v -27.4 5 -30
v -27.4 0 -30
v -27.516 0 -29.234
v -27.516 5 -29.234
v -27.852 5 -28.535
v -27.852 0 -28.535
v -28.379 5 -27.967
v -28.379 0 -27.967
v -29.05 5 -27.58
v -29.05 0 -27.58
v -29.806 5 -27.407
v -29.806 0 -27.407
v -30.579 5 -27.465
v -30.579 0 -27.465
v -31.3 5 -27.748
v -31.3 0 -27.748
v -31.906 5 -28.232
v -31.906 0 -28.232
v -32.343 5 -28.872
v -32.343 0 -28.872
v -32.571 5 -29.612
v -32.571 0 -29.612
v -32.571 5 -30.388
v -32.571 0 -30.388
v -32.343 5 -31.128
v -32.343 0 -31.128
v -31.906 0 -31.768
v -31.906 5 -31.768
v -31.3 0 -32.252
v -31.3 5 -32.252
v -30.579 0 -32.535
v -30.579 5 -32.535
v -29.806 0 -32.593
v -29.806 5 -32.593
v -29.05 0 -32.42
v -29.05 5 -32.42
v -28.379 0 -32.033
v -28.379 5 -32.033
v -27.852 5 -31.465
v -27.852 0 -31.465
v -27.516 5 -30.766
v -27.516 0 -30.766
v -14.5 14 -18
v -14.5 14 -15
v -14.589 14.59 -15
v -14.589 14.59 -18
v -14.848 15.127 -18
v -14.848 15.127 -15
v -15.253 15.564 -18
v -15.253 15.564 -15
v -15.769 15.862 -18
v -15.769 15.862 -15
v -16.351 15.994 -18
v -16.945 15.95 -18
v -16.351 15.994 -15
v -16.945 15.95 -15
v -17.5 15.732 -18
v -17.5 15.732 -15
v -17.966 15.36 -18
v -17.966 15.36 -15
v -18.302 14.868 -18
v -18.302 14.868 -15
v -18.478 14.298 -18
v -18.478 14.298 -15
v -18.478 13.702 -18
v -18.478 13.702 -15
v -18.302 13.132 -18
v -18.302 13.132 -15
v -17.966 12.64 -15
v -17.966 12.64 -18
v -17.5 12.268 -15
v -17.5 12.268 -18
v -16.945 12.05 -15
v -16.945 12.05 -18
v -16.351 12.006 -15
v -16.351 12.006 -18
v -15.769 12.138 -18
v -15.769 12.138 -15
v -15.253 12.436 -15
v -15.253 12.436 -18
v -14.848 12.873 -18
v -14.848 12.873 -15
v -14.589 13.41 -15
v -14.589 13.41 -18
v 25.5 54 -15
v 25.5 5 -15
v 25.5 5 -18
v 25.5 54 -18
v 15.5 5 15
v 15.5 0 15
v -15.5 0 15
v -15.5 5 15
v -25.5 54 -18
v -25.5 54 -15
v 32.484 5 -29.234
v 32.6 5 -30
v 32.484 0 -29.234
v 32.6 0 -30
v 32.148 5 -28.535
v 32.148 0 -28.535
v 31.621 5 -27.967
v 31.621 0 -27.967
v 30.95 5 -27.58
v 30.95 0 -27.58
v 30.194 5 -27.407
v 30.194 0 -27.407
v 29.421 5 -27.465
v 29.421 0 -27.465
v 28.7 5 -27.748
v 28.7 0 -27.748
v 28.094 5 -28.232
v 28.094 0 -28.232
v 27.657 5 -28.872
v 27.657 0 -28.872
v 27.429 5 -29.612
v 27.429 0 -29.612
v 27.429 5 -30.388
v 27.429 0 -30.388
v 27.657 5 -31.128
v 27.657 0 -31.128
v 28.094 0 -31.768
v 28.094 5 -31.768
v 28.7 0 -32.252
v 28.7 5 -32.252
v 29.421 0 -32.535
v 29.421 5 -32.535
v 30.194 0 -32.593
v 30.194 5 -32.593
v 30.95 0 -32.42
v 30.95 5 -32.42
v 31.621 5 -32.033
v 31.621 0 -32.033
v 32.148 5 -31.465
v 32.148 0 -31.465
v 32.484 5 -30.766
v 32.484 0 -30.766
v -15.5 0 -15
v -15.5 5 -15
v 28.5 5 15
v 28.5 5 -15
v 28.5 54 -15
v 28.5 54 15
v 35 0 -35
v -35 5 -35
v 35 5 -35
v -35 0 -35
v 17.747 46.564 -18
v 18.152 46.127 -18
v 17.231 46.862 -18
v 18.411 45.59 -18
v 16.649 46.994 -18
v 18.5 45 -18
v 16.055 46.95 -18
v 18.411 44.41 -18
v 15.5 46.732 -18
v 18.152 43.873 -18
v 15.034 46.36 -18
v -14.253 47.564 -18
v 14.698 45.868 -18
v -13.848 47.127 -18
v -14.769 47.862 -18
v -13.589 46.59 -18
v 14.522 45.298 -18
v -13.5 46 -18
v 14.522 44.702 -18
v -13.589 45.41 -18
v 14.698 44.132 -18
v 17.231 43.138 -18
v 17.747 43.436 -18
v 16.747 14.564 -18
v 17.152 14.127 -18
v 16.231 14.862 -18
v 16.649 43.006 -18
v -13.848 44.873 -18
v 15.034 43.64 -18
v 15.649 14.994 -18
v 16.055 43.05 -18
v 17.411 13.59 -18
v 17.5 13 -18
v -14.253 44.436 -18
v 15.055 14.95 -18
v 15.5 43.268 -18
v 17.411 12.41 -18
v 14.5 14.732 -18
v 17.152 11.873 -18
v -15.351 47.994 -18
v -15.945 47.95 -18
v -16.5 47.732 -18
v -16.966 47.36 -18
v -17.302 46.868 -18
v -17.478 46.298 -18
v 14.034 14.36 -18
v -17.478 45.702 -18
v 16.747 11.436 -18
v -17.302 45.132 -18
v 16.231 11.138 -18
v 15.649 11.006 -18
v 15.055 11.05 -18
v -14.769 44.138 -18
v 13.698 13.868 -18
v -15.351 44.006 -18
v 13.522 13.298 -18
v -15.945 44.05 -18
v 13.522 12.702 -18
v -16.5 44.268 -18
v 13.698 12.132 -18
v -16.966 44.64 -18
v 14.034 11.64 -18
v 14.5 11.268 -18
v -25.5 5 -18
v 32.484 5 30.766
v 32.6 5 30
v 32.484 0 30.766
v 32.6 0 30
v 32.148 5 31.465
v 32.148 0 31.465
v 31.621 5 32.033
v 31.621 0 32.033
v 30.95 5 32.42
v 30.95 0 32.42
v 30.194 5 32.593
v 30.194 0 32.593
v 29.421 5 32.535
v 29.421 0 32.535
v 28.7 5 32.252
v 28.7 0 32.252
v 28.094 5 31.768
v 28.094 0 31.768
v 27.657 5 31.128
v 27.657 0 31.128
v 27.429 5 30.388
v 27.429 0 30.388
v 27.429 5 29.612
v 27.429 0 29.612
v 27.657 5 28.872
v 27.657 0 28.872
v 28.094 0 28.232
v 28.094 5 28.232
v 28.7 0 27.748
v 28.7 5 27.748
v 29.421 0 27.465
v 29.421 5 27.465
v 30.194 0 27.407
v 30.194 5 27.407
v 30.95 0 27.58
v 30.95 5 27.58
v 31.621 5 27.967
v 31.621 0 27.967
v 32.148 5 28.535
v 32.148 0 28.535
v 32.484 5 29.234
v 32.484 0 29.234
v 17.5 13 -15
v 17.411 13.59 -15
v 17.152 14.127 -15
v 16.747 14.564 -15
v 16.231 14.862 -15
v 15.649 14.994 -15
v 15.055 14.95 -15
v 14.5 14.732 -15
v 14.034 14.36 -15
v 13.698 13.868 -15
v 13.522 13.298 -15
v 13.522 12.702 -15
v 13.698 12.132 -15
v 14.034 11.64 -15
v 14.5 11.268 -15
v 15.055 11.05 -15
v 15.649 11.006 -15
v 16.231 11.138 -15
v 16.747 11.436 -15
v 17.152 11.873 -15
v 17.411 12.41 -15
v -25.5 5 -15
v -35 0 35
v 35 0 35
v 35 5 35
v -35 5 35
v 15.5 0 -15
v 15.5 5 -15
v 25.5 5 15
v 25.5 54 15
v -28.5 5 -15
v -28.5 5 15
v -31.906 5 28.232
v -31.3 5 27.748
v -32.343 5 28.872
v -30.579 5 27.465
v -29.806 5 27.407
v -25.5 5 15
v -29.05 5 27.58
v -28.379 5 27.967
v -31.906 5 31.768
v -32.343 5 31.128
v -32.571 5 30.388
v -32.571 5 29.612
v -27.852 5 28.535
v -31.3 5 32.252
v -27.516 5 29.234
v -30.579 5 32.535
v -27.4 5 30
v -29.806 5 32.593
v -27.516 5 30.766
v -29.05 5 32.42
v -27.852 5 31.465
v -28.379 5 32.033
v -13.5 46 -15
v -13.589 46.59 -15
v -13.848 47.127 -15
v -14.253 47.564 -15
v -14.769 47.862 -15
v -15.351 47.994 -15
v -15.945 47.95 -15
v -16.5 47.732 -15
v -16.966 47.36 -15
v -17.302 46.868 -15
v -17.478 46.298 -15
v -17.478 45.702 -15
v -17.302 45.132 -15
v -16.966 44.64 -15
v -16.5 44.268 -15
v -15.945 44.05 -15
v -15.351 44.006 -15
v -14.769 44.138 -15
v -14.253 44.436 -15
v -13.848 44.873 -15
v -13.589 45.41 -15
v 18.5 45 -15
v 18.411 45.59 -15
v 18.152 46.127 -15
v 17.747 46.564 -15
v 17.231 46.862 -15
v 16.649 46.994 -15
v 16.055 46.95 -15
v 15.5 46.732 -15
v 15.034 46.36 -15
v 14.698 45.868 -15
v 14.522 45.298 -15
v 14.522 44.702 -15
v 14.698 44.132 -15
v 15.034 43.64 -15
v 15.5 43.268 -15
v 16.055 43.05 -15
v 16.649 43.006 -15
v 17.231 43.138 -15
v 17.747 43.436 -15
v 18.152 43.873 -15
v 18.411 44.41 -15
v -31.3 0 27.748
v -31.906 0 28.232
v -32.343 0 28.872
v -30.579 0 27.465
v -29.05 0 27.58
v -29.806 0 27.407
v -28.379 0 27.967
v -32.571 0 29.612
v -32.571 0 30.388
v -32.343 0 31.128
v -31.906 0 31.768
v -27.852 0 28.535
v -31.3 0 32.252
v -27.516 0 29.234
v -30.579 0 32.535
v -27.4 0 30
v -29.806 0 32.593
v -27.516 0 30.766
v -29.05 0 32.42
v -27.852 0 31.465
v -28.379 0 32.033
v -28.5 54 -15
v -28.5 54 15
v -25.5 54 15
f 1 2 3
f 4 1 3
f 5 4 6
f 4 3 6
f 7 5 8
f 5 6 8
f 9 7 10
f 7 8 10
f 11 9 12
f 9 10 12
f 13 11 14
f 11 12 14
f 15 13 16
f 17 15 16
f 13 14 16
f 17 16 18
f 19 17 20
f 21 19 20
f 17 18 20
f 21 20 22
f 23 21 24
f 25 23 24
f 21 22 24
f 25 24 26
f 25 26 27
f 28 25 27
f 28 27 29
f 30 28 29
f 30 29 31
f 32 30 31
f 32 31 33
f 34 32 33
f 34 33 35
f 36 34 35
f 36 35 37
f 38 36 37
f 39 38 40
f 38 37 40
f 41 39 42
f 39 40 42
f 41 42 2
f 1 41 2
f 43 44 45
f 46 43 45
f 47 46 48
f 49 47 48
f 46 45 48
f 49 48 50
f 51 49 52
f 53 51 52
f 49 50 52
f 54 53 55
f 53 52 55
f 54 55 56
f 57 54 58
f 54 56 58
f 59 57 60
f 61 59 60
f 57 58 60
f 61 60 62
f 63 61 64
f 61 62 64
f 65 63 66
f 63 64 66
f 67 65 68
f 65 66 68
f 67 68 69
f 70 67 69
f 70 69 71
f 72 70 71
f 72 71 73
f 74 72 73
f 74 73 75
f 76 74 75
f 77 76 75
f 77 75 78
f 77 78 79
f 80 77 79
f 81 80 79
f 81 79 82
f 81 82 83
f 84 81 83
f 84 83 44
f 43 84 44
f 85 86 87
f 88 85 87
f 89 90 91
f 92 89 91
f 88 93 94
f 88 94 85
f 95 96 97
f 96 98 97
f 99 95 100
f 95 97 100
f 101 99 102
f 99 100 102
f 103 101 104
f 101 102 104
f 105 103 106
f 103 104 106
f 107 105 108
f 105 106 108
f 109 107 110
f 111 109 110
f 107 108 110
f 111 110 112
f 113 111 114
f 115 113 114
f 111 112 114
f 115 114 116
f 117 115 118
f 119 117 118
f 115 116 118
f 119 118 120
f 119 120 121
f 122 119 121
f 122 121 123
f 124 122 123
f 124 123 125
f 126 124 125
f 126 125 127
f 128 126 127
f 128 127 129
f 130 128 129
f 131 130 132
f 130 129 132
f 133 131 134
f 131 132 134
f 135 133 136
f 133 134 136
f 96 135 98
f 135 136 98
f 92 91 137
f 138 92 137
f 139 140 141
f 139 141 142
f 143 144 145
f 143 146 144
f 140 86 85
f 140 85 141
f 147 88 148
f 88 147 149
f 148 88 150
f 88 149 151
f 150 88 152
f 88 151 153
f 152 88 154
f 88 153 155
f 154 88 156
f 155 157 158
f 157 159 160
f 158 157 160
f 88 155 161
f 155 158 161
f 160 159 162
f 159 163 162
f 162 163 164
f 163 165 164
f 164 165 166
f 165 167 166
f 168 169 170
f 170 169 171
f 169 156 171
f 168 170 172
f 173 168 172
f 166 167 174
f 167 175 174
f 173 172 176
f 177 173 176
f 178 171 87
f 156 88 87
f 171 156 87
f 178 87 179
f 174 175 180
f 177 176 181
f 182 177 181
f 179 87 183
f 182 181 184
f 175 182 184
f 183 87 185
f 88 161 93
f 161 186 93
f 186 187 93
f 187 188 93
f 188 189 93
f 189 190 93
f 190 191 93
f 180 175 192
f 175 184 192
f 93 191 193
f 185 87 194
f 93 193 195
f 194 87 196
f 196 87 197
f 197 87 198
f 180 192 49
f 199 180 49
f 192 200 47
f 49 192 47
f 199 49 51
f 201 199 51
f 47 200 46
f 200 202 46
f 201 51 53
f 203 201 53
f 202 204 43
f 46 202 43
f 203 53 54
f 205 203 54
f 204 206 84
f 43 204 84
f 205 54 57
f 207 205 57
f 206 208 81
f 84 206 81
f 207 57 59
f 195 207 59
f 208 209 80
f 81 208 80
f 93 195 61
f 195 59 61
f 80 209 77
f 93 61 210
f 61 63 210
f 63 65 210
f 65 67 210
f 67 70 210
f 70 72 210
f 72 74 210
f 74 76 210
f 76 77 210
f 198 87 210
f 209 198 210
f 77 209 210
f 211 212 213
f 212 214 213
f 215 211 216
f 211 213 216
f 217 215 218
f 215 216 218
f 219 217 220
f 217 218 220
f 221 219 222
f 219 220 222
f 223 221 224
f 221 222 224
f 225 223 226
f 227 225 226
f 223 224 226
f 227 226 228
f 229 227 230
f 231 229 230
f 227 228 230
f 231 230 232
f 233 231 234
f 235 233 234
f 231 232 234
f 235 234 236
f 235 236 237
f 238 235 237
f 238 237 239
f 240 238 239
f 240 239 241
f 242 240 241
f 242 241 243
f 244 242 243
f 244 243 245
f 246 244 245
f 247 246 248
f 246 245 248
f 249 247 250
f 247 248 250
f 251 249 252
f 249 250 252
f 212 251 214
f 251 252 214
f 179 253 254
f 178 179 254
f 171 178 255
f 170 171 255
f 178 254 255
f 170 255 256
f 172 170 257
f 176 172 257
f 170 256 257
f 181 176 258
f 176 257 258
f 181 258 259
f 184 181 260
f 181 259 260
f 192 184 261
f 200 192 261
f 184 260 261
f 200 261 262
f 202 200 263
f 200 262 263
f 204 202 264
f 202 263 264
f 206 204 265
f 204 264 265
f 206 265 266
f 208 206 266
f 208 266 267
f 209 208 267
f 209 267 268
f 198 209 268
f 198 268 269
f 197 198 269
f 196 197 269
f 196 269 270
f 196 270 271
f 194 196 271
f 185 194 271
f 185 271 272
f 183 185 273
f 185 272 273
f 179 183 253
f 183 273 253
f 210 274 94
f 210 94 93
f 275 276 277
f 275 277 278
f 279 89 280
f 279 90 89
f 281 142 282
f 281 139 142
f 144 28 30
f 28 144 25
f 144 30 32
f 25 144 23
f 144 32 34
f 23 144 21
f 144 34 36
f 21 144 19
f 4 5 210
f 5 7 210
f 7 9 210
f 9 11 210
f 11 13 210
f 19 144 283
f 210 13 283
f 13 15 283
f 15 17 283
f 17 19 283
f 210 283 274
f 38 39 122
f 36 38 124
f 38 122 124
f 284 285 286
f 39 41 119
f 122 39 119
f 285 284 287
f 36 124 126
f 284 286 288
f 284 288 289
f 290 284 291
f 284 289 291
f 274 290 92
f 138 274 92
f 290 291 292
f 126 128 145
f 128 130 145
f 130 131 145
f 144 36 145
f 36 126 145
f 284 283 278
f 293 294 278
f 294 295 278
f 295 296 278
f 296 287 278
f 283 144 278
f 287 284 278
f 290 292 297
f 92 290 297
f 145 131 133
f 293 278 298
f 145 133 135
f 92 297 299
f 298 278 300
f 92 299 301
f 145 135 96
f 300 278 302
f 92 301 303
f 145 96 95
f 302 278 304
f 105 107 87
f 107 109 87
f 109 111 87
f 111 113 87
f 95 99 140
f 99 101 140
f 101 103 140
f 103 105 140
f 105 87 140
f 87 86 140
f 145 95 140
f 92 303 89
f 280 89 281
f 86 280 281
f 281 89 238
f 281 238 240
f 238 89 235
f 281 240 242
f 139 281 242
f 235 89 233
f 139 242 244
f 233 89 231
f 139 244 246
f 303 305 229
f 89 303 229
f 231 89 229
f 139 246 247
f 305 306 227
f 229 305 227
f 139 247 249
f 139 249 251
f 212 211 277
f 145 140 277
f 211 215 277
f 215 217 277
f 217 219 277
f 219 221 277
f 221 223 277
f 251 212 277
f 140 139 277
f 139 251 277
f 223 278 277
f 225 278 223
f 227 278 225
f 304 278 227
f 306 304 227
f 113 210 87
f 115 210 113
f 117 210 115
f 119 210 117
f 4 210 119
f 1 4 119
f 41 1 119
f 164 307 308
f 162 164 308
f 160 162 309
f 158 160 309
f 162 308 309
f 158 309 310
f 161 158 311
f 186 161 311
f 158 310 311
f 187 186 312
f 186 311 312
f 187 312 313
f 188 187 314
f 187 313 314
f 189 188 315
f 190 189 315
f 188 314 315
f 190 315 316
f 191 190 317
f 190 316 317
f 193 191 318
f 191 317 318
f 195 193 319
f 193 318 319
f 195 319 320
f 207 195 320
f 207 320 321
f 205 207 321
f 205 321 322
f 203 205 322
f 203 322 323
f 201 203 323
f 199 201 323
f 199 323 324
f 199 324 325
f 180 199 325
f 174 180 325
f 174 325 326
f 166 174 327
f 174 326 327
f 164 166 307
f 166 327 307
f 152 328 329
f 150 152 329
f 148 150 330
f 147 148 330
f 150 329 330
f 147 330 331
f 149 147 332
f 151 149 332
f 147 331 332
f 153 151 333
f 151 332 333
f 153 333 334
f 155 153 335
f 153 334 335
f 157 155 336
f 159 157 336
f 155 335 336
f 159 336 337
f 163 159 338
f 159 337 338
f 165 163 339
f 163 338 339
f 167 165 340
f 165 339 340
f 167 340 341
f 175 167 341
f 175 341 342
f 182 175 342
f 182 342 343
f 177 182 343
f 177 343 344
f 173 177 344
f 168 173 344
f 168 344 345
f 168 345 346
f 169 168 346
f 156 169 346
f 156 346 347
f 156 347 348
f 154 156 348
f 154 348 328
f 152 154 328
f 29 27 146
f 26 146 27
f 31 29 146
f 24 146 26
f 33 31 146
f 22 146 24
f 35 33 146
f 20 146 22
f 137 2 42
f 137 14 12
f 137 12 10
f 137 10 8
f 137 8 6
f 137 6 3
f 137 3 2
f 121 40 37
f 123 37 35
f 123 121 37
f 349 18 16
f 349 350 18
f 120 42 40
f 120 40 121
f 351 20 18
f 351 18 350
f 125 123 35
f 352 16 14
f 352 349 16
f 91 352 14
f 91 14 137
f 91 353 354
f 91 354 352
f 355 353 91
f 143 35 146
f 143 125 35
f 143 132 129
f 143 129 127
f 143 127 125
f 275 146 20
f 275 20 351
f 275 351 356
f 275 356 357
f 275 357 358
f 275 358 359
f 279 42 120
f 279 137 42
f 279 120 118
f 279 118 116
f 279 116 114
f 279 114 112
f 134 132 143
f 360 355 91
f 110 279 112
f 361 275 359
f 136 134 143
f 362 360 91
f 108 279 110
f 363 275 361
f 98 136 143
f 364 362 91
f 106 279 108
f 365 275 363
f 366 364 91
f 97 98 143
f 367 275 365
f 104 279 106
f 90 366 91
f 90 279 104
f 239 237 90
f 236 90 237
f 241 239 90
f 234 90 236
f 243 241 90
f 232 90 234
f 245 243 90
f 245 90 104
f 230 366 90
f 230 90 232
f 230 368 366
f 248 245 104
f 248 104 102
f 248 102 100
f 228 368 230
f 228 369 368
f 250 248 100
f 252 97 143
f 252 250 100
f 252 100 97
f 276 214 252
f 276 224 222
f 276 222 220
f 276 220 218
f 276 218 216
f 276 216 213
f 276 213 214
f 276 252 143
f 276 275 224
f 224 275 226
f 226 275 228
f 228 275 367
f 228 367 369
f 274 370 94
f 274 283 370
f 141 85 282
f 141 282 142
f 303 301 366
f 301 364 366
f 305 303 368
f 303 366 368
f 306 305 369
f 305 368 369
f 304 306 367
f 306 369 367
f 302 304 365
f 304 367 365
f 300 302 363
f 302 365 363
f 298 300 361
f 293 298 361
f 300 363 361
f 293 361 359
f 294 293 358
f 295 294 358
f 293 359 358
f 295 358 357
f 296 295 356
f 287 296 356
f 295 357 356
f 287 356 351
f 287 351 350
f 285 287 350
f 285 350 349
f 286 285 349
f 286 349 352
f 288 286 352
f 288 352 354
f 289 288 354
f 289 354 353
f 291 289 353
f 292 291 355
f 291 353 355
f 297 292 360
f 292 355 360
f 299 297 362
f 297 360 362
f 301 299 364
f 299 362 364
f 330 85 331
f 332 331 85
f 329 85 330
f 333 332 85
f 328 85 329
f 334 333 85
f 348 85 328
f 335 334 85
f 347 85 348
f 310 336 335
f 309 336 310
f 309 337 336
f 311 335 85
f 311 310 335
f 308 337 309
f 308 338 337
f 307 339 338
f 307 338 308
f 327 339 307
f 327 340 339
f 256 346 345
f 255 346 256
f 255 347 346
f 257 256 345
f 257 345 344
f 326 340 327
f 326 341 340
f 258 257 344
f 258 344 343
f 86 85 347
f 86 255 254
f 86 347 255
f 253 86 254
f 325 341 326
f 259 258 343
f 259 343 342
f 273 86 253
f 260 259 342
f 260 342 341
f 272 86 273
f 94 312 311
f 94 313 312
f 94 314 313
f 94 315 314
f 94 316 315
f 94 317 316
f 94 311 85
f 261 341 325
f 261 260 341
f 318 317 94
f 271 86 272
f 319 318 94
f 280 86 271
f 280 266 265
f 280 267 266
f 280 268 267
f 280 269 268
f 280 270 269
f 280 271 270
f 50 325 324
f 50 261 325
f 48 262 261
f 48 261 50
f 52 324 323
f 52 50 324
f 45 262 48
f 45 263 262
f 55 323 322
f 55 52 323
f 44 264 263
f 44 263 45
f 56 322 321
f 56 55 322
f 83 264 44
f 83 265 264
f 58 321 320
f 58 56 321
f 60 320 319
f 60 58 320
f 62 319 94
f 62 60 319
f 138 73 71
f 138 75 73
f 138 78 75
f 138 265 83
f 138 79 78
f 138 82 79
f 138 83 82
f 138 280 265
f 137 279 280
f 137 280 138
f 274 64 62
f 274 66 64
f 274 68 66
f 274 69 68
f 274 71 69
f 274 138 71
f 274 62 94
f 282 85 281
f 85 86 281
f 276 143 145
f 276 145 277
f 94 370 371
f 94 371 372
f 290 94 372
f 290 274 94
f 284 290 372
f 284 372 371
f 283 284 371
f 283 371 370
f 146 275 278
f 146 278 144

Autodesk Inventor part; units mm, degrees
ref_plane "YZ Plane" through (0, 0, 0) normal (1, 0, 0) x (0, 1, 0)
ref_plane "XZ Plane" through (0, 0, 0) normal (0, 1, 0) x (-1, 0, 0)
ref_plane "XY Plane" through (0, 0, 0) normal (0, 0, 1) x (1, 0, 0)
sketch "Boceto1" plane through (0, 0, 0) normal (0, 1, 0) x (-1, 0, 0)
  line L0 (25.5, 15) -> (-25.5, 15)
  line L1 (-25.5, 15) -> (-25.5, -15)
  line L2 (-25.5, -15) -> (25.5, -15)
  line L3 (25.5, -15) -> (25.5, 15)
  line L4 (25.5, 15) -> (-25.5, -15) construction
  line L5 (-25.5, 15) -> (25.5, -15) construction
  line L6 (-15.5, 15) -> (-15.5, -15)
  line L7 (0, 15) -> (0, 11.847)
  line L8 (-25.5, 0) -> (-22.3332, 0)
  line L9 (25.5, 15) -> (25.5, -15)
  line L10 (15.5, 15) -> (15.5, -15)
  line L11 (25.5, 0) -> (22.3332, 0)
  line L12 (-25.5, -15) -> (-25.5, 15)
  line L13 (-25.5, 0) -> (-22.3332, 0)
  line L14 (-25.5, 15) -> (-25.5, -15)
  point P0 (0, 0)
  point P1 (31.5, 22.5)
  dimension "d2" = 10
  dimension "d21" = 51
  dimension "d22" = 30
extrude "Extrusión1" add sketch "Boceto1" along normal blind 5 contours L3 L2 L10 L0 | L6 L2 L1 L0
sketch "Boceto4" plane through (0, 0, 0) normal (0, 1, 0) x (-1, 0, 0)
  line L0 (-28.5, 18) -> (28.5, 18)
  line L1 (28.5, 18) -> (28.5, -18)
  line L2 (28.5, -18) -> (-28.5, -18)
  line L3 (-28.5, -18) -> (-28.5, 18)
  line L4 (-28.5, 18) -> (28.5, -18) construction
  line L5 (28.5, 18) -> (-28.5, -18) construction
  line L6 (28.5, -15) -> (-28.5, -15)
  line L7 (-28.5, 15) -> (28.5, 15)
  line L8 (25.5, -18) -> (25.5, 18)
  line L9 (-25.5, 18) -> (-25.5, -18)
  line L10 (-25.5, -15) -> (-15.5, -15) projected
  point P0 (0, 0)
  point P1 (-25.5, -15)
  point P2 (-25.5, 15)
  point P3 (25.5, 15)
  point P4 (25.5, -15)
  dimension "d23" = 57
  dimension "d24" = 36
  dimension "d27" = 0
extrude "Extrusión4" add sketch "Boceto4" along normal blind 5 contours L0 L8 L7 L9 | L7 L9 L6 L3 | L7 L1 L6 L8 | L6 L8 L2 L9
sketch "Boceto5" plane through (0, 5, 0) normal (0, 1, 0) x (1, 0, 0)
  line L0 (25.5, 18) -> (-25.5, 18) projected
  line L1 (25.5, 15) -> (25.5, 18) projected
  line L2 (-25.5, 18) -> (25.5, 18)
  line L3 (25.5, 18) -> (25.5, 15)
  line L4 (25.5, 15) -> (-25.5, 15)
  line L5 (-25.5, 15) -> (-25.5, 18)
  point P0 (0, 0)
extrude "Extrusión5" add sketch "Boceto5" along normal blind 49
sketch "Boceto6" plane through (-15.5, 0, -15) normal (0, 0, 1) x (1, 0, 0)
  circle A0 centre (32, 45) radius 2
  line L0 (41, 5) -> (41, 54) projected
  line L1 (-10, 54) -> (41, 54) projected
  line L2 (-10, 5) -> (-10, 54) projected
  line L3 (-10, 29.5) -> (15.5, 29.5)
  line L4 (15.5, 29.5) -> (15.5, 54)
  circle A1 centre (0, 46) radius 2
  circle A2 centre (-1, 14) radius 2
  circle A3 centre (31, 13) radius 2
  point P0 (15.5, 0)
  dimension "d30" = 4
  dimension "d31" = 9
  dimension "d32" = 9
  dimension "d35" = 360
extrude "Extrusión6" cut sketch "Boceto6" against normal blind 49 contours A0 | A1 | A2 | A3
sketch "Boceto7" plane through (0, 5, 0) normal (0, 1, 0) x (1, 0, 0)
  line L0 (-28.5, 15) -> (-28.5, -15) projected
  line L1 (-28.5, 15) -> (-25.5, 15)
  line L2 (-25.5, 15) -> (-25.5, -15)
  line L3 (-25.5, -15) -> (-28.5, -15)
  line L4 (-28.5, -15) -> (-28.5, 15)
  line L5 (28.5, 15) -> (25.5, 15) projected
  line L6 (25.5, -15) -> (28.5, -15) projected
  line L7 (28.5, 15) -> (25.5, 15)
  line L8 (25.5, 15) -> (25.5, -15)
  line L9 (25.5, -15) -> (28.5, -15)
  line L10 (28.5, -15) -> (28.5, 15)
  point P0 (0, 0)
  point P1 (25.5, -18)
extrude "Extrusión7" add sketch "Boceto7" along normal blind 49
sketch "Boceto12" plane through (0, 0, 0) normal (0, -1, 0) x (1, 0, 0)
  line L0 (-35, -35) -> (35, -35)
  line L1 (35, -35) -> (35, 35)
  line L2 (35, 35) -> (-35, 35)
  line L3 (-35, 35) -> (-35, -35)
  line L4 (-35, -35) -> (35, 35) construction
  line L5 (35, -35) -> (-35, 35) construction
  line L6 (30, 30) -> (-30, 30)
  line L7 (-30, 30) -> (-30, -30)
  line L8 (-30, -30) -> (30, -30)
  line L9 (30, -30) -> (30, 30)
  line L10 (30, 30) -> (-30, -30) construction
  line L11 (-30, 30) -> (30, -30) construction
  circle A0 centre (-30, 30) radius 2.6
  circle A1 centre (30, 30) radius 2.6
  circle A2 centre (30, -30) radius 2.6
  circle A3 centre (-30, -30) radius 2.6
  line L12 (15.5, -15) -> (15.5, 15) projected
  line L13 (-15.5, -15) -> (15.5, -15)
  line L14 (15.5, -15) -> (15.5, 15)
  line L15 (15.5, 15) -> (-15.5, 15)
  line L16 (-15.5, 15) -> (-15.5, -15)
  line L17 (-15.5, -15) -> (15.5, 15) construction
  line L18 (15.5, -15) -> (-15.5, 15) construction
  point P0 (0, 0)
  point P1 (0, 0)
  dimension "d63" = 70
  dimension "d64" = 70
  dimension "d65" = 60
  dimension "d66" = 5.2
  dimension "d67" = 5.2
  dimension "d68" = 5.2
  dimension "d69" = 5.2
extrude "Extrusión10" add sketch "Boceto12" against normal blind 5 contours L3 L2 L1 L0 | L6 A1 L9 A2 L8 A3 L7 A0
properties part number "depth_camera_fastening"
